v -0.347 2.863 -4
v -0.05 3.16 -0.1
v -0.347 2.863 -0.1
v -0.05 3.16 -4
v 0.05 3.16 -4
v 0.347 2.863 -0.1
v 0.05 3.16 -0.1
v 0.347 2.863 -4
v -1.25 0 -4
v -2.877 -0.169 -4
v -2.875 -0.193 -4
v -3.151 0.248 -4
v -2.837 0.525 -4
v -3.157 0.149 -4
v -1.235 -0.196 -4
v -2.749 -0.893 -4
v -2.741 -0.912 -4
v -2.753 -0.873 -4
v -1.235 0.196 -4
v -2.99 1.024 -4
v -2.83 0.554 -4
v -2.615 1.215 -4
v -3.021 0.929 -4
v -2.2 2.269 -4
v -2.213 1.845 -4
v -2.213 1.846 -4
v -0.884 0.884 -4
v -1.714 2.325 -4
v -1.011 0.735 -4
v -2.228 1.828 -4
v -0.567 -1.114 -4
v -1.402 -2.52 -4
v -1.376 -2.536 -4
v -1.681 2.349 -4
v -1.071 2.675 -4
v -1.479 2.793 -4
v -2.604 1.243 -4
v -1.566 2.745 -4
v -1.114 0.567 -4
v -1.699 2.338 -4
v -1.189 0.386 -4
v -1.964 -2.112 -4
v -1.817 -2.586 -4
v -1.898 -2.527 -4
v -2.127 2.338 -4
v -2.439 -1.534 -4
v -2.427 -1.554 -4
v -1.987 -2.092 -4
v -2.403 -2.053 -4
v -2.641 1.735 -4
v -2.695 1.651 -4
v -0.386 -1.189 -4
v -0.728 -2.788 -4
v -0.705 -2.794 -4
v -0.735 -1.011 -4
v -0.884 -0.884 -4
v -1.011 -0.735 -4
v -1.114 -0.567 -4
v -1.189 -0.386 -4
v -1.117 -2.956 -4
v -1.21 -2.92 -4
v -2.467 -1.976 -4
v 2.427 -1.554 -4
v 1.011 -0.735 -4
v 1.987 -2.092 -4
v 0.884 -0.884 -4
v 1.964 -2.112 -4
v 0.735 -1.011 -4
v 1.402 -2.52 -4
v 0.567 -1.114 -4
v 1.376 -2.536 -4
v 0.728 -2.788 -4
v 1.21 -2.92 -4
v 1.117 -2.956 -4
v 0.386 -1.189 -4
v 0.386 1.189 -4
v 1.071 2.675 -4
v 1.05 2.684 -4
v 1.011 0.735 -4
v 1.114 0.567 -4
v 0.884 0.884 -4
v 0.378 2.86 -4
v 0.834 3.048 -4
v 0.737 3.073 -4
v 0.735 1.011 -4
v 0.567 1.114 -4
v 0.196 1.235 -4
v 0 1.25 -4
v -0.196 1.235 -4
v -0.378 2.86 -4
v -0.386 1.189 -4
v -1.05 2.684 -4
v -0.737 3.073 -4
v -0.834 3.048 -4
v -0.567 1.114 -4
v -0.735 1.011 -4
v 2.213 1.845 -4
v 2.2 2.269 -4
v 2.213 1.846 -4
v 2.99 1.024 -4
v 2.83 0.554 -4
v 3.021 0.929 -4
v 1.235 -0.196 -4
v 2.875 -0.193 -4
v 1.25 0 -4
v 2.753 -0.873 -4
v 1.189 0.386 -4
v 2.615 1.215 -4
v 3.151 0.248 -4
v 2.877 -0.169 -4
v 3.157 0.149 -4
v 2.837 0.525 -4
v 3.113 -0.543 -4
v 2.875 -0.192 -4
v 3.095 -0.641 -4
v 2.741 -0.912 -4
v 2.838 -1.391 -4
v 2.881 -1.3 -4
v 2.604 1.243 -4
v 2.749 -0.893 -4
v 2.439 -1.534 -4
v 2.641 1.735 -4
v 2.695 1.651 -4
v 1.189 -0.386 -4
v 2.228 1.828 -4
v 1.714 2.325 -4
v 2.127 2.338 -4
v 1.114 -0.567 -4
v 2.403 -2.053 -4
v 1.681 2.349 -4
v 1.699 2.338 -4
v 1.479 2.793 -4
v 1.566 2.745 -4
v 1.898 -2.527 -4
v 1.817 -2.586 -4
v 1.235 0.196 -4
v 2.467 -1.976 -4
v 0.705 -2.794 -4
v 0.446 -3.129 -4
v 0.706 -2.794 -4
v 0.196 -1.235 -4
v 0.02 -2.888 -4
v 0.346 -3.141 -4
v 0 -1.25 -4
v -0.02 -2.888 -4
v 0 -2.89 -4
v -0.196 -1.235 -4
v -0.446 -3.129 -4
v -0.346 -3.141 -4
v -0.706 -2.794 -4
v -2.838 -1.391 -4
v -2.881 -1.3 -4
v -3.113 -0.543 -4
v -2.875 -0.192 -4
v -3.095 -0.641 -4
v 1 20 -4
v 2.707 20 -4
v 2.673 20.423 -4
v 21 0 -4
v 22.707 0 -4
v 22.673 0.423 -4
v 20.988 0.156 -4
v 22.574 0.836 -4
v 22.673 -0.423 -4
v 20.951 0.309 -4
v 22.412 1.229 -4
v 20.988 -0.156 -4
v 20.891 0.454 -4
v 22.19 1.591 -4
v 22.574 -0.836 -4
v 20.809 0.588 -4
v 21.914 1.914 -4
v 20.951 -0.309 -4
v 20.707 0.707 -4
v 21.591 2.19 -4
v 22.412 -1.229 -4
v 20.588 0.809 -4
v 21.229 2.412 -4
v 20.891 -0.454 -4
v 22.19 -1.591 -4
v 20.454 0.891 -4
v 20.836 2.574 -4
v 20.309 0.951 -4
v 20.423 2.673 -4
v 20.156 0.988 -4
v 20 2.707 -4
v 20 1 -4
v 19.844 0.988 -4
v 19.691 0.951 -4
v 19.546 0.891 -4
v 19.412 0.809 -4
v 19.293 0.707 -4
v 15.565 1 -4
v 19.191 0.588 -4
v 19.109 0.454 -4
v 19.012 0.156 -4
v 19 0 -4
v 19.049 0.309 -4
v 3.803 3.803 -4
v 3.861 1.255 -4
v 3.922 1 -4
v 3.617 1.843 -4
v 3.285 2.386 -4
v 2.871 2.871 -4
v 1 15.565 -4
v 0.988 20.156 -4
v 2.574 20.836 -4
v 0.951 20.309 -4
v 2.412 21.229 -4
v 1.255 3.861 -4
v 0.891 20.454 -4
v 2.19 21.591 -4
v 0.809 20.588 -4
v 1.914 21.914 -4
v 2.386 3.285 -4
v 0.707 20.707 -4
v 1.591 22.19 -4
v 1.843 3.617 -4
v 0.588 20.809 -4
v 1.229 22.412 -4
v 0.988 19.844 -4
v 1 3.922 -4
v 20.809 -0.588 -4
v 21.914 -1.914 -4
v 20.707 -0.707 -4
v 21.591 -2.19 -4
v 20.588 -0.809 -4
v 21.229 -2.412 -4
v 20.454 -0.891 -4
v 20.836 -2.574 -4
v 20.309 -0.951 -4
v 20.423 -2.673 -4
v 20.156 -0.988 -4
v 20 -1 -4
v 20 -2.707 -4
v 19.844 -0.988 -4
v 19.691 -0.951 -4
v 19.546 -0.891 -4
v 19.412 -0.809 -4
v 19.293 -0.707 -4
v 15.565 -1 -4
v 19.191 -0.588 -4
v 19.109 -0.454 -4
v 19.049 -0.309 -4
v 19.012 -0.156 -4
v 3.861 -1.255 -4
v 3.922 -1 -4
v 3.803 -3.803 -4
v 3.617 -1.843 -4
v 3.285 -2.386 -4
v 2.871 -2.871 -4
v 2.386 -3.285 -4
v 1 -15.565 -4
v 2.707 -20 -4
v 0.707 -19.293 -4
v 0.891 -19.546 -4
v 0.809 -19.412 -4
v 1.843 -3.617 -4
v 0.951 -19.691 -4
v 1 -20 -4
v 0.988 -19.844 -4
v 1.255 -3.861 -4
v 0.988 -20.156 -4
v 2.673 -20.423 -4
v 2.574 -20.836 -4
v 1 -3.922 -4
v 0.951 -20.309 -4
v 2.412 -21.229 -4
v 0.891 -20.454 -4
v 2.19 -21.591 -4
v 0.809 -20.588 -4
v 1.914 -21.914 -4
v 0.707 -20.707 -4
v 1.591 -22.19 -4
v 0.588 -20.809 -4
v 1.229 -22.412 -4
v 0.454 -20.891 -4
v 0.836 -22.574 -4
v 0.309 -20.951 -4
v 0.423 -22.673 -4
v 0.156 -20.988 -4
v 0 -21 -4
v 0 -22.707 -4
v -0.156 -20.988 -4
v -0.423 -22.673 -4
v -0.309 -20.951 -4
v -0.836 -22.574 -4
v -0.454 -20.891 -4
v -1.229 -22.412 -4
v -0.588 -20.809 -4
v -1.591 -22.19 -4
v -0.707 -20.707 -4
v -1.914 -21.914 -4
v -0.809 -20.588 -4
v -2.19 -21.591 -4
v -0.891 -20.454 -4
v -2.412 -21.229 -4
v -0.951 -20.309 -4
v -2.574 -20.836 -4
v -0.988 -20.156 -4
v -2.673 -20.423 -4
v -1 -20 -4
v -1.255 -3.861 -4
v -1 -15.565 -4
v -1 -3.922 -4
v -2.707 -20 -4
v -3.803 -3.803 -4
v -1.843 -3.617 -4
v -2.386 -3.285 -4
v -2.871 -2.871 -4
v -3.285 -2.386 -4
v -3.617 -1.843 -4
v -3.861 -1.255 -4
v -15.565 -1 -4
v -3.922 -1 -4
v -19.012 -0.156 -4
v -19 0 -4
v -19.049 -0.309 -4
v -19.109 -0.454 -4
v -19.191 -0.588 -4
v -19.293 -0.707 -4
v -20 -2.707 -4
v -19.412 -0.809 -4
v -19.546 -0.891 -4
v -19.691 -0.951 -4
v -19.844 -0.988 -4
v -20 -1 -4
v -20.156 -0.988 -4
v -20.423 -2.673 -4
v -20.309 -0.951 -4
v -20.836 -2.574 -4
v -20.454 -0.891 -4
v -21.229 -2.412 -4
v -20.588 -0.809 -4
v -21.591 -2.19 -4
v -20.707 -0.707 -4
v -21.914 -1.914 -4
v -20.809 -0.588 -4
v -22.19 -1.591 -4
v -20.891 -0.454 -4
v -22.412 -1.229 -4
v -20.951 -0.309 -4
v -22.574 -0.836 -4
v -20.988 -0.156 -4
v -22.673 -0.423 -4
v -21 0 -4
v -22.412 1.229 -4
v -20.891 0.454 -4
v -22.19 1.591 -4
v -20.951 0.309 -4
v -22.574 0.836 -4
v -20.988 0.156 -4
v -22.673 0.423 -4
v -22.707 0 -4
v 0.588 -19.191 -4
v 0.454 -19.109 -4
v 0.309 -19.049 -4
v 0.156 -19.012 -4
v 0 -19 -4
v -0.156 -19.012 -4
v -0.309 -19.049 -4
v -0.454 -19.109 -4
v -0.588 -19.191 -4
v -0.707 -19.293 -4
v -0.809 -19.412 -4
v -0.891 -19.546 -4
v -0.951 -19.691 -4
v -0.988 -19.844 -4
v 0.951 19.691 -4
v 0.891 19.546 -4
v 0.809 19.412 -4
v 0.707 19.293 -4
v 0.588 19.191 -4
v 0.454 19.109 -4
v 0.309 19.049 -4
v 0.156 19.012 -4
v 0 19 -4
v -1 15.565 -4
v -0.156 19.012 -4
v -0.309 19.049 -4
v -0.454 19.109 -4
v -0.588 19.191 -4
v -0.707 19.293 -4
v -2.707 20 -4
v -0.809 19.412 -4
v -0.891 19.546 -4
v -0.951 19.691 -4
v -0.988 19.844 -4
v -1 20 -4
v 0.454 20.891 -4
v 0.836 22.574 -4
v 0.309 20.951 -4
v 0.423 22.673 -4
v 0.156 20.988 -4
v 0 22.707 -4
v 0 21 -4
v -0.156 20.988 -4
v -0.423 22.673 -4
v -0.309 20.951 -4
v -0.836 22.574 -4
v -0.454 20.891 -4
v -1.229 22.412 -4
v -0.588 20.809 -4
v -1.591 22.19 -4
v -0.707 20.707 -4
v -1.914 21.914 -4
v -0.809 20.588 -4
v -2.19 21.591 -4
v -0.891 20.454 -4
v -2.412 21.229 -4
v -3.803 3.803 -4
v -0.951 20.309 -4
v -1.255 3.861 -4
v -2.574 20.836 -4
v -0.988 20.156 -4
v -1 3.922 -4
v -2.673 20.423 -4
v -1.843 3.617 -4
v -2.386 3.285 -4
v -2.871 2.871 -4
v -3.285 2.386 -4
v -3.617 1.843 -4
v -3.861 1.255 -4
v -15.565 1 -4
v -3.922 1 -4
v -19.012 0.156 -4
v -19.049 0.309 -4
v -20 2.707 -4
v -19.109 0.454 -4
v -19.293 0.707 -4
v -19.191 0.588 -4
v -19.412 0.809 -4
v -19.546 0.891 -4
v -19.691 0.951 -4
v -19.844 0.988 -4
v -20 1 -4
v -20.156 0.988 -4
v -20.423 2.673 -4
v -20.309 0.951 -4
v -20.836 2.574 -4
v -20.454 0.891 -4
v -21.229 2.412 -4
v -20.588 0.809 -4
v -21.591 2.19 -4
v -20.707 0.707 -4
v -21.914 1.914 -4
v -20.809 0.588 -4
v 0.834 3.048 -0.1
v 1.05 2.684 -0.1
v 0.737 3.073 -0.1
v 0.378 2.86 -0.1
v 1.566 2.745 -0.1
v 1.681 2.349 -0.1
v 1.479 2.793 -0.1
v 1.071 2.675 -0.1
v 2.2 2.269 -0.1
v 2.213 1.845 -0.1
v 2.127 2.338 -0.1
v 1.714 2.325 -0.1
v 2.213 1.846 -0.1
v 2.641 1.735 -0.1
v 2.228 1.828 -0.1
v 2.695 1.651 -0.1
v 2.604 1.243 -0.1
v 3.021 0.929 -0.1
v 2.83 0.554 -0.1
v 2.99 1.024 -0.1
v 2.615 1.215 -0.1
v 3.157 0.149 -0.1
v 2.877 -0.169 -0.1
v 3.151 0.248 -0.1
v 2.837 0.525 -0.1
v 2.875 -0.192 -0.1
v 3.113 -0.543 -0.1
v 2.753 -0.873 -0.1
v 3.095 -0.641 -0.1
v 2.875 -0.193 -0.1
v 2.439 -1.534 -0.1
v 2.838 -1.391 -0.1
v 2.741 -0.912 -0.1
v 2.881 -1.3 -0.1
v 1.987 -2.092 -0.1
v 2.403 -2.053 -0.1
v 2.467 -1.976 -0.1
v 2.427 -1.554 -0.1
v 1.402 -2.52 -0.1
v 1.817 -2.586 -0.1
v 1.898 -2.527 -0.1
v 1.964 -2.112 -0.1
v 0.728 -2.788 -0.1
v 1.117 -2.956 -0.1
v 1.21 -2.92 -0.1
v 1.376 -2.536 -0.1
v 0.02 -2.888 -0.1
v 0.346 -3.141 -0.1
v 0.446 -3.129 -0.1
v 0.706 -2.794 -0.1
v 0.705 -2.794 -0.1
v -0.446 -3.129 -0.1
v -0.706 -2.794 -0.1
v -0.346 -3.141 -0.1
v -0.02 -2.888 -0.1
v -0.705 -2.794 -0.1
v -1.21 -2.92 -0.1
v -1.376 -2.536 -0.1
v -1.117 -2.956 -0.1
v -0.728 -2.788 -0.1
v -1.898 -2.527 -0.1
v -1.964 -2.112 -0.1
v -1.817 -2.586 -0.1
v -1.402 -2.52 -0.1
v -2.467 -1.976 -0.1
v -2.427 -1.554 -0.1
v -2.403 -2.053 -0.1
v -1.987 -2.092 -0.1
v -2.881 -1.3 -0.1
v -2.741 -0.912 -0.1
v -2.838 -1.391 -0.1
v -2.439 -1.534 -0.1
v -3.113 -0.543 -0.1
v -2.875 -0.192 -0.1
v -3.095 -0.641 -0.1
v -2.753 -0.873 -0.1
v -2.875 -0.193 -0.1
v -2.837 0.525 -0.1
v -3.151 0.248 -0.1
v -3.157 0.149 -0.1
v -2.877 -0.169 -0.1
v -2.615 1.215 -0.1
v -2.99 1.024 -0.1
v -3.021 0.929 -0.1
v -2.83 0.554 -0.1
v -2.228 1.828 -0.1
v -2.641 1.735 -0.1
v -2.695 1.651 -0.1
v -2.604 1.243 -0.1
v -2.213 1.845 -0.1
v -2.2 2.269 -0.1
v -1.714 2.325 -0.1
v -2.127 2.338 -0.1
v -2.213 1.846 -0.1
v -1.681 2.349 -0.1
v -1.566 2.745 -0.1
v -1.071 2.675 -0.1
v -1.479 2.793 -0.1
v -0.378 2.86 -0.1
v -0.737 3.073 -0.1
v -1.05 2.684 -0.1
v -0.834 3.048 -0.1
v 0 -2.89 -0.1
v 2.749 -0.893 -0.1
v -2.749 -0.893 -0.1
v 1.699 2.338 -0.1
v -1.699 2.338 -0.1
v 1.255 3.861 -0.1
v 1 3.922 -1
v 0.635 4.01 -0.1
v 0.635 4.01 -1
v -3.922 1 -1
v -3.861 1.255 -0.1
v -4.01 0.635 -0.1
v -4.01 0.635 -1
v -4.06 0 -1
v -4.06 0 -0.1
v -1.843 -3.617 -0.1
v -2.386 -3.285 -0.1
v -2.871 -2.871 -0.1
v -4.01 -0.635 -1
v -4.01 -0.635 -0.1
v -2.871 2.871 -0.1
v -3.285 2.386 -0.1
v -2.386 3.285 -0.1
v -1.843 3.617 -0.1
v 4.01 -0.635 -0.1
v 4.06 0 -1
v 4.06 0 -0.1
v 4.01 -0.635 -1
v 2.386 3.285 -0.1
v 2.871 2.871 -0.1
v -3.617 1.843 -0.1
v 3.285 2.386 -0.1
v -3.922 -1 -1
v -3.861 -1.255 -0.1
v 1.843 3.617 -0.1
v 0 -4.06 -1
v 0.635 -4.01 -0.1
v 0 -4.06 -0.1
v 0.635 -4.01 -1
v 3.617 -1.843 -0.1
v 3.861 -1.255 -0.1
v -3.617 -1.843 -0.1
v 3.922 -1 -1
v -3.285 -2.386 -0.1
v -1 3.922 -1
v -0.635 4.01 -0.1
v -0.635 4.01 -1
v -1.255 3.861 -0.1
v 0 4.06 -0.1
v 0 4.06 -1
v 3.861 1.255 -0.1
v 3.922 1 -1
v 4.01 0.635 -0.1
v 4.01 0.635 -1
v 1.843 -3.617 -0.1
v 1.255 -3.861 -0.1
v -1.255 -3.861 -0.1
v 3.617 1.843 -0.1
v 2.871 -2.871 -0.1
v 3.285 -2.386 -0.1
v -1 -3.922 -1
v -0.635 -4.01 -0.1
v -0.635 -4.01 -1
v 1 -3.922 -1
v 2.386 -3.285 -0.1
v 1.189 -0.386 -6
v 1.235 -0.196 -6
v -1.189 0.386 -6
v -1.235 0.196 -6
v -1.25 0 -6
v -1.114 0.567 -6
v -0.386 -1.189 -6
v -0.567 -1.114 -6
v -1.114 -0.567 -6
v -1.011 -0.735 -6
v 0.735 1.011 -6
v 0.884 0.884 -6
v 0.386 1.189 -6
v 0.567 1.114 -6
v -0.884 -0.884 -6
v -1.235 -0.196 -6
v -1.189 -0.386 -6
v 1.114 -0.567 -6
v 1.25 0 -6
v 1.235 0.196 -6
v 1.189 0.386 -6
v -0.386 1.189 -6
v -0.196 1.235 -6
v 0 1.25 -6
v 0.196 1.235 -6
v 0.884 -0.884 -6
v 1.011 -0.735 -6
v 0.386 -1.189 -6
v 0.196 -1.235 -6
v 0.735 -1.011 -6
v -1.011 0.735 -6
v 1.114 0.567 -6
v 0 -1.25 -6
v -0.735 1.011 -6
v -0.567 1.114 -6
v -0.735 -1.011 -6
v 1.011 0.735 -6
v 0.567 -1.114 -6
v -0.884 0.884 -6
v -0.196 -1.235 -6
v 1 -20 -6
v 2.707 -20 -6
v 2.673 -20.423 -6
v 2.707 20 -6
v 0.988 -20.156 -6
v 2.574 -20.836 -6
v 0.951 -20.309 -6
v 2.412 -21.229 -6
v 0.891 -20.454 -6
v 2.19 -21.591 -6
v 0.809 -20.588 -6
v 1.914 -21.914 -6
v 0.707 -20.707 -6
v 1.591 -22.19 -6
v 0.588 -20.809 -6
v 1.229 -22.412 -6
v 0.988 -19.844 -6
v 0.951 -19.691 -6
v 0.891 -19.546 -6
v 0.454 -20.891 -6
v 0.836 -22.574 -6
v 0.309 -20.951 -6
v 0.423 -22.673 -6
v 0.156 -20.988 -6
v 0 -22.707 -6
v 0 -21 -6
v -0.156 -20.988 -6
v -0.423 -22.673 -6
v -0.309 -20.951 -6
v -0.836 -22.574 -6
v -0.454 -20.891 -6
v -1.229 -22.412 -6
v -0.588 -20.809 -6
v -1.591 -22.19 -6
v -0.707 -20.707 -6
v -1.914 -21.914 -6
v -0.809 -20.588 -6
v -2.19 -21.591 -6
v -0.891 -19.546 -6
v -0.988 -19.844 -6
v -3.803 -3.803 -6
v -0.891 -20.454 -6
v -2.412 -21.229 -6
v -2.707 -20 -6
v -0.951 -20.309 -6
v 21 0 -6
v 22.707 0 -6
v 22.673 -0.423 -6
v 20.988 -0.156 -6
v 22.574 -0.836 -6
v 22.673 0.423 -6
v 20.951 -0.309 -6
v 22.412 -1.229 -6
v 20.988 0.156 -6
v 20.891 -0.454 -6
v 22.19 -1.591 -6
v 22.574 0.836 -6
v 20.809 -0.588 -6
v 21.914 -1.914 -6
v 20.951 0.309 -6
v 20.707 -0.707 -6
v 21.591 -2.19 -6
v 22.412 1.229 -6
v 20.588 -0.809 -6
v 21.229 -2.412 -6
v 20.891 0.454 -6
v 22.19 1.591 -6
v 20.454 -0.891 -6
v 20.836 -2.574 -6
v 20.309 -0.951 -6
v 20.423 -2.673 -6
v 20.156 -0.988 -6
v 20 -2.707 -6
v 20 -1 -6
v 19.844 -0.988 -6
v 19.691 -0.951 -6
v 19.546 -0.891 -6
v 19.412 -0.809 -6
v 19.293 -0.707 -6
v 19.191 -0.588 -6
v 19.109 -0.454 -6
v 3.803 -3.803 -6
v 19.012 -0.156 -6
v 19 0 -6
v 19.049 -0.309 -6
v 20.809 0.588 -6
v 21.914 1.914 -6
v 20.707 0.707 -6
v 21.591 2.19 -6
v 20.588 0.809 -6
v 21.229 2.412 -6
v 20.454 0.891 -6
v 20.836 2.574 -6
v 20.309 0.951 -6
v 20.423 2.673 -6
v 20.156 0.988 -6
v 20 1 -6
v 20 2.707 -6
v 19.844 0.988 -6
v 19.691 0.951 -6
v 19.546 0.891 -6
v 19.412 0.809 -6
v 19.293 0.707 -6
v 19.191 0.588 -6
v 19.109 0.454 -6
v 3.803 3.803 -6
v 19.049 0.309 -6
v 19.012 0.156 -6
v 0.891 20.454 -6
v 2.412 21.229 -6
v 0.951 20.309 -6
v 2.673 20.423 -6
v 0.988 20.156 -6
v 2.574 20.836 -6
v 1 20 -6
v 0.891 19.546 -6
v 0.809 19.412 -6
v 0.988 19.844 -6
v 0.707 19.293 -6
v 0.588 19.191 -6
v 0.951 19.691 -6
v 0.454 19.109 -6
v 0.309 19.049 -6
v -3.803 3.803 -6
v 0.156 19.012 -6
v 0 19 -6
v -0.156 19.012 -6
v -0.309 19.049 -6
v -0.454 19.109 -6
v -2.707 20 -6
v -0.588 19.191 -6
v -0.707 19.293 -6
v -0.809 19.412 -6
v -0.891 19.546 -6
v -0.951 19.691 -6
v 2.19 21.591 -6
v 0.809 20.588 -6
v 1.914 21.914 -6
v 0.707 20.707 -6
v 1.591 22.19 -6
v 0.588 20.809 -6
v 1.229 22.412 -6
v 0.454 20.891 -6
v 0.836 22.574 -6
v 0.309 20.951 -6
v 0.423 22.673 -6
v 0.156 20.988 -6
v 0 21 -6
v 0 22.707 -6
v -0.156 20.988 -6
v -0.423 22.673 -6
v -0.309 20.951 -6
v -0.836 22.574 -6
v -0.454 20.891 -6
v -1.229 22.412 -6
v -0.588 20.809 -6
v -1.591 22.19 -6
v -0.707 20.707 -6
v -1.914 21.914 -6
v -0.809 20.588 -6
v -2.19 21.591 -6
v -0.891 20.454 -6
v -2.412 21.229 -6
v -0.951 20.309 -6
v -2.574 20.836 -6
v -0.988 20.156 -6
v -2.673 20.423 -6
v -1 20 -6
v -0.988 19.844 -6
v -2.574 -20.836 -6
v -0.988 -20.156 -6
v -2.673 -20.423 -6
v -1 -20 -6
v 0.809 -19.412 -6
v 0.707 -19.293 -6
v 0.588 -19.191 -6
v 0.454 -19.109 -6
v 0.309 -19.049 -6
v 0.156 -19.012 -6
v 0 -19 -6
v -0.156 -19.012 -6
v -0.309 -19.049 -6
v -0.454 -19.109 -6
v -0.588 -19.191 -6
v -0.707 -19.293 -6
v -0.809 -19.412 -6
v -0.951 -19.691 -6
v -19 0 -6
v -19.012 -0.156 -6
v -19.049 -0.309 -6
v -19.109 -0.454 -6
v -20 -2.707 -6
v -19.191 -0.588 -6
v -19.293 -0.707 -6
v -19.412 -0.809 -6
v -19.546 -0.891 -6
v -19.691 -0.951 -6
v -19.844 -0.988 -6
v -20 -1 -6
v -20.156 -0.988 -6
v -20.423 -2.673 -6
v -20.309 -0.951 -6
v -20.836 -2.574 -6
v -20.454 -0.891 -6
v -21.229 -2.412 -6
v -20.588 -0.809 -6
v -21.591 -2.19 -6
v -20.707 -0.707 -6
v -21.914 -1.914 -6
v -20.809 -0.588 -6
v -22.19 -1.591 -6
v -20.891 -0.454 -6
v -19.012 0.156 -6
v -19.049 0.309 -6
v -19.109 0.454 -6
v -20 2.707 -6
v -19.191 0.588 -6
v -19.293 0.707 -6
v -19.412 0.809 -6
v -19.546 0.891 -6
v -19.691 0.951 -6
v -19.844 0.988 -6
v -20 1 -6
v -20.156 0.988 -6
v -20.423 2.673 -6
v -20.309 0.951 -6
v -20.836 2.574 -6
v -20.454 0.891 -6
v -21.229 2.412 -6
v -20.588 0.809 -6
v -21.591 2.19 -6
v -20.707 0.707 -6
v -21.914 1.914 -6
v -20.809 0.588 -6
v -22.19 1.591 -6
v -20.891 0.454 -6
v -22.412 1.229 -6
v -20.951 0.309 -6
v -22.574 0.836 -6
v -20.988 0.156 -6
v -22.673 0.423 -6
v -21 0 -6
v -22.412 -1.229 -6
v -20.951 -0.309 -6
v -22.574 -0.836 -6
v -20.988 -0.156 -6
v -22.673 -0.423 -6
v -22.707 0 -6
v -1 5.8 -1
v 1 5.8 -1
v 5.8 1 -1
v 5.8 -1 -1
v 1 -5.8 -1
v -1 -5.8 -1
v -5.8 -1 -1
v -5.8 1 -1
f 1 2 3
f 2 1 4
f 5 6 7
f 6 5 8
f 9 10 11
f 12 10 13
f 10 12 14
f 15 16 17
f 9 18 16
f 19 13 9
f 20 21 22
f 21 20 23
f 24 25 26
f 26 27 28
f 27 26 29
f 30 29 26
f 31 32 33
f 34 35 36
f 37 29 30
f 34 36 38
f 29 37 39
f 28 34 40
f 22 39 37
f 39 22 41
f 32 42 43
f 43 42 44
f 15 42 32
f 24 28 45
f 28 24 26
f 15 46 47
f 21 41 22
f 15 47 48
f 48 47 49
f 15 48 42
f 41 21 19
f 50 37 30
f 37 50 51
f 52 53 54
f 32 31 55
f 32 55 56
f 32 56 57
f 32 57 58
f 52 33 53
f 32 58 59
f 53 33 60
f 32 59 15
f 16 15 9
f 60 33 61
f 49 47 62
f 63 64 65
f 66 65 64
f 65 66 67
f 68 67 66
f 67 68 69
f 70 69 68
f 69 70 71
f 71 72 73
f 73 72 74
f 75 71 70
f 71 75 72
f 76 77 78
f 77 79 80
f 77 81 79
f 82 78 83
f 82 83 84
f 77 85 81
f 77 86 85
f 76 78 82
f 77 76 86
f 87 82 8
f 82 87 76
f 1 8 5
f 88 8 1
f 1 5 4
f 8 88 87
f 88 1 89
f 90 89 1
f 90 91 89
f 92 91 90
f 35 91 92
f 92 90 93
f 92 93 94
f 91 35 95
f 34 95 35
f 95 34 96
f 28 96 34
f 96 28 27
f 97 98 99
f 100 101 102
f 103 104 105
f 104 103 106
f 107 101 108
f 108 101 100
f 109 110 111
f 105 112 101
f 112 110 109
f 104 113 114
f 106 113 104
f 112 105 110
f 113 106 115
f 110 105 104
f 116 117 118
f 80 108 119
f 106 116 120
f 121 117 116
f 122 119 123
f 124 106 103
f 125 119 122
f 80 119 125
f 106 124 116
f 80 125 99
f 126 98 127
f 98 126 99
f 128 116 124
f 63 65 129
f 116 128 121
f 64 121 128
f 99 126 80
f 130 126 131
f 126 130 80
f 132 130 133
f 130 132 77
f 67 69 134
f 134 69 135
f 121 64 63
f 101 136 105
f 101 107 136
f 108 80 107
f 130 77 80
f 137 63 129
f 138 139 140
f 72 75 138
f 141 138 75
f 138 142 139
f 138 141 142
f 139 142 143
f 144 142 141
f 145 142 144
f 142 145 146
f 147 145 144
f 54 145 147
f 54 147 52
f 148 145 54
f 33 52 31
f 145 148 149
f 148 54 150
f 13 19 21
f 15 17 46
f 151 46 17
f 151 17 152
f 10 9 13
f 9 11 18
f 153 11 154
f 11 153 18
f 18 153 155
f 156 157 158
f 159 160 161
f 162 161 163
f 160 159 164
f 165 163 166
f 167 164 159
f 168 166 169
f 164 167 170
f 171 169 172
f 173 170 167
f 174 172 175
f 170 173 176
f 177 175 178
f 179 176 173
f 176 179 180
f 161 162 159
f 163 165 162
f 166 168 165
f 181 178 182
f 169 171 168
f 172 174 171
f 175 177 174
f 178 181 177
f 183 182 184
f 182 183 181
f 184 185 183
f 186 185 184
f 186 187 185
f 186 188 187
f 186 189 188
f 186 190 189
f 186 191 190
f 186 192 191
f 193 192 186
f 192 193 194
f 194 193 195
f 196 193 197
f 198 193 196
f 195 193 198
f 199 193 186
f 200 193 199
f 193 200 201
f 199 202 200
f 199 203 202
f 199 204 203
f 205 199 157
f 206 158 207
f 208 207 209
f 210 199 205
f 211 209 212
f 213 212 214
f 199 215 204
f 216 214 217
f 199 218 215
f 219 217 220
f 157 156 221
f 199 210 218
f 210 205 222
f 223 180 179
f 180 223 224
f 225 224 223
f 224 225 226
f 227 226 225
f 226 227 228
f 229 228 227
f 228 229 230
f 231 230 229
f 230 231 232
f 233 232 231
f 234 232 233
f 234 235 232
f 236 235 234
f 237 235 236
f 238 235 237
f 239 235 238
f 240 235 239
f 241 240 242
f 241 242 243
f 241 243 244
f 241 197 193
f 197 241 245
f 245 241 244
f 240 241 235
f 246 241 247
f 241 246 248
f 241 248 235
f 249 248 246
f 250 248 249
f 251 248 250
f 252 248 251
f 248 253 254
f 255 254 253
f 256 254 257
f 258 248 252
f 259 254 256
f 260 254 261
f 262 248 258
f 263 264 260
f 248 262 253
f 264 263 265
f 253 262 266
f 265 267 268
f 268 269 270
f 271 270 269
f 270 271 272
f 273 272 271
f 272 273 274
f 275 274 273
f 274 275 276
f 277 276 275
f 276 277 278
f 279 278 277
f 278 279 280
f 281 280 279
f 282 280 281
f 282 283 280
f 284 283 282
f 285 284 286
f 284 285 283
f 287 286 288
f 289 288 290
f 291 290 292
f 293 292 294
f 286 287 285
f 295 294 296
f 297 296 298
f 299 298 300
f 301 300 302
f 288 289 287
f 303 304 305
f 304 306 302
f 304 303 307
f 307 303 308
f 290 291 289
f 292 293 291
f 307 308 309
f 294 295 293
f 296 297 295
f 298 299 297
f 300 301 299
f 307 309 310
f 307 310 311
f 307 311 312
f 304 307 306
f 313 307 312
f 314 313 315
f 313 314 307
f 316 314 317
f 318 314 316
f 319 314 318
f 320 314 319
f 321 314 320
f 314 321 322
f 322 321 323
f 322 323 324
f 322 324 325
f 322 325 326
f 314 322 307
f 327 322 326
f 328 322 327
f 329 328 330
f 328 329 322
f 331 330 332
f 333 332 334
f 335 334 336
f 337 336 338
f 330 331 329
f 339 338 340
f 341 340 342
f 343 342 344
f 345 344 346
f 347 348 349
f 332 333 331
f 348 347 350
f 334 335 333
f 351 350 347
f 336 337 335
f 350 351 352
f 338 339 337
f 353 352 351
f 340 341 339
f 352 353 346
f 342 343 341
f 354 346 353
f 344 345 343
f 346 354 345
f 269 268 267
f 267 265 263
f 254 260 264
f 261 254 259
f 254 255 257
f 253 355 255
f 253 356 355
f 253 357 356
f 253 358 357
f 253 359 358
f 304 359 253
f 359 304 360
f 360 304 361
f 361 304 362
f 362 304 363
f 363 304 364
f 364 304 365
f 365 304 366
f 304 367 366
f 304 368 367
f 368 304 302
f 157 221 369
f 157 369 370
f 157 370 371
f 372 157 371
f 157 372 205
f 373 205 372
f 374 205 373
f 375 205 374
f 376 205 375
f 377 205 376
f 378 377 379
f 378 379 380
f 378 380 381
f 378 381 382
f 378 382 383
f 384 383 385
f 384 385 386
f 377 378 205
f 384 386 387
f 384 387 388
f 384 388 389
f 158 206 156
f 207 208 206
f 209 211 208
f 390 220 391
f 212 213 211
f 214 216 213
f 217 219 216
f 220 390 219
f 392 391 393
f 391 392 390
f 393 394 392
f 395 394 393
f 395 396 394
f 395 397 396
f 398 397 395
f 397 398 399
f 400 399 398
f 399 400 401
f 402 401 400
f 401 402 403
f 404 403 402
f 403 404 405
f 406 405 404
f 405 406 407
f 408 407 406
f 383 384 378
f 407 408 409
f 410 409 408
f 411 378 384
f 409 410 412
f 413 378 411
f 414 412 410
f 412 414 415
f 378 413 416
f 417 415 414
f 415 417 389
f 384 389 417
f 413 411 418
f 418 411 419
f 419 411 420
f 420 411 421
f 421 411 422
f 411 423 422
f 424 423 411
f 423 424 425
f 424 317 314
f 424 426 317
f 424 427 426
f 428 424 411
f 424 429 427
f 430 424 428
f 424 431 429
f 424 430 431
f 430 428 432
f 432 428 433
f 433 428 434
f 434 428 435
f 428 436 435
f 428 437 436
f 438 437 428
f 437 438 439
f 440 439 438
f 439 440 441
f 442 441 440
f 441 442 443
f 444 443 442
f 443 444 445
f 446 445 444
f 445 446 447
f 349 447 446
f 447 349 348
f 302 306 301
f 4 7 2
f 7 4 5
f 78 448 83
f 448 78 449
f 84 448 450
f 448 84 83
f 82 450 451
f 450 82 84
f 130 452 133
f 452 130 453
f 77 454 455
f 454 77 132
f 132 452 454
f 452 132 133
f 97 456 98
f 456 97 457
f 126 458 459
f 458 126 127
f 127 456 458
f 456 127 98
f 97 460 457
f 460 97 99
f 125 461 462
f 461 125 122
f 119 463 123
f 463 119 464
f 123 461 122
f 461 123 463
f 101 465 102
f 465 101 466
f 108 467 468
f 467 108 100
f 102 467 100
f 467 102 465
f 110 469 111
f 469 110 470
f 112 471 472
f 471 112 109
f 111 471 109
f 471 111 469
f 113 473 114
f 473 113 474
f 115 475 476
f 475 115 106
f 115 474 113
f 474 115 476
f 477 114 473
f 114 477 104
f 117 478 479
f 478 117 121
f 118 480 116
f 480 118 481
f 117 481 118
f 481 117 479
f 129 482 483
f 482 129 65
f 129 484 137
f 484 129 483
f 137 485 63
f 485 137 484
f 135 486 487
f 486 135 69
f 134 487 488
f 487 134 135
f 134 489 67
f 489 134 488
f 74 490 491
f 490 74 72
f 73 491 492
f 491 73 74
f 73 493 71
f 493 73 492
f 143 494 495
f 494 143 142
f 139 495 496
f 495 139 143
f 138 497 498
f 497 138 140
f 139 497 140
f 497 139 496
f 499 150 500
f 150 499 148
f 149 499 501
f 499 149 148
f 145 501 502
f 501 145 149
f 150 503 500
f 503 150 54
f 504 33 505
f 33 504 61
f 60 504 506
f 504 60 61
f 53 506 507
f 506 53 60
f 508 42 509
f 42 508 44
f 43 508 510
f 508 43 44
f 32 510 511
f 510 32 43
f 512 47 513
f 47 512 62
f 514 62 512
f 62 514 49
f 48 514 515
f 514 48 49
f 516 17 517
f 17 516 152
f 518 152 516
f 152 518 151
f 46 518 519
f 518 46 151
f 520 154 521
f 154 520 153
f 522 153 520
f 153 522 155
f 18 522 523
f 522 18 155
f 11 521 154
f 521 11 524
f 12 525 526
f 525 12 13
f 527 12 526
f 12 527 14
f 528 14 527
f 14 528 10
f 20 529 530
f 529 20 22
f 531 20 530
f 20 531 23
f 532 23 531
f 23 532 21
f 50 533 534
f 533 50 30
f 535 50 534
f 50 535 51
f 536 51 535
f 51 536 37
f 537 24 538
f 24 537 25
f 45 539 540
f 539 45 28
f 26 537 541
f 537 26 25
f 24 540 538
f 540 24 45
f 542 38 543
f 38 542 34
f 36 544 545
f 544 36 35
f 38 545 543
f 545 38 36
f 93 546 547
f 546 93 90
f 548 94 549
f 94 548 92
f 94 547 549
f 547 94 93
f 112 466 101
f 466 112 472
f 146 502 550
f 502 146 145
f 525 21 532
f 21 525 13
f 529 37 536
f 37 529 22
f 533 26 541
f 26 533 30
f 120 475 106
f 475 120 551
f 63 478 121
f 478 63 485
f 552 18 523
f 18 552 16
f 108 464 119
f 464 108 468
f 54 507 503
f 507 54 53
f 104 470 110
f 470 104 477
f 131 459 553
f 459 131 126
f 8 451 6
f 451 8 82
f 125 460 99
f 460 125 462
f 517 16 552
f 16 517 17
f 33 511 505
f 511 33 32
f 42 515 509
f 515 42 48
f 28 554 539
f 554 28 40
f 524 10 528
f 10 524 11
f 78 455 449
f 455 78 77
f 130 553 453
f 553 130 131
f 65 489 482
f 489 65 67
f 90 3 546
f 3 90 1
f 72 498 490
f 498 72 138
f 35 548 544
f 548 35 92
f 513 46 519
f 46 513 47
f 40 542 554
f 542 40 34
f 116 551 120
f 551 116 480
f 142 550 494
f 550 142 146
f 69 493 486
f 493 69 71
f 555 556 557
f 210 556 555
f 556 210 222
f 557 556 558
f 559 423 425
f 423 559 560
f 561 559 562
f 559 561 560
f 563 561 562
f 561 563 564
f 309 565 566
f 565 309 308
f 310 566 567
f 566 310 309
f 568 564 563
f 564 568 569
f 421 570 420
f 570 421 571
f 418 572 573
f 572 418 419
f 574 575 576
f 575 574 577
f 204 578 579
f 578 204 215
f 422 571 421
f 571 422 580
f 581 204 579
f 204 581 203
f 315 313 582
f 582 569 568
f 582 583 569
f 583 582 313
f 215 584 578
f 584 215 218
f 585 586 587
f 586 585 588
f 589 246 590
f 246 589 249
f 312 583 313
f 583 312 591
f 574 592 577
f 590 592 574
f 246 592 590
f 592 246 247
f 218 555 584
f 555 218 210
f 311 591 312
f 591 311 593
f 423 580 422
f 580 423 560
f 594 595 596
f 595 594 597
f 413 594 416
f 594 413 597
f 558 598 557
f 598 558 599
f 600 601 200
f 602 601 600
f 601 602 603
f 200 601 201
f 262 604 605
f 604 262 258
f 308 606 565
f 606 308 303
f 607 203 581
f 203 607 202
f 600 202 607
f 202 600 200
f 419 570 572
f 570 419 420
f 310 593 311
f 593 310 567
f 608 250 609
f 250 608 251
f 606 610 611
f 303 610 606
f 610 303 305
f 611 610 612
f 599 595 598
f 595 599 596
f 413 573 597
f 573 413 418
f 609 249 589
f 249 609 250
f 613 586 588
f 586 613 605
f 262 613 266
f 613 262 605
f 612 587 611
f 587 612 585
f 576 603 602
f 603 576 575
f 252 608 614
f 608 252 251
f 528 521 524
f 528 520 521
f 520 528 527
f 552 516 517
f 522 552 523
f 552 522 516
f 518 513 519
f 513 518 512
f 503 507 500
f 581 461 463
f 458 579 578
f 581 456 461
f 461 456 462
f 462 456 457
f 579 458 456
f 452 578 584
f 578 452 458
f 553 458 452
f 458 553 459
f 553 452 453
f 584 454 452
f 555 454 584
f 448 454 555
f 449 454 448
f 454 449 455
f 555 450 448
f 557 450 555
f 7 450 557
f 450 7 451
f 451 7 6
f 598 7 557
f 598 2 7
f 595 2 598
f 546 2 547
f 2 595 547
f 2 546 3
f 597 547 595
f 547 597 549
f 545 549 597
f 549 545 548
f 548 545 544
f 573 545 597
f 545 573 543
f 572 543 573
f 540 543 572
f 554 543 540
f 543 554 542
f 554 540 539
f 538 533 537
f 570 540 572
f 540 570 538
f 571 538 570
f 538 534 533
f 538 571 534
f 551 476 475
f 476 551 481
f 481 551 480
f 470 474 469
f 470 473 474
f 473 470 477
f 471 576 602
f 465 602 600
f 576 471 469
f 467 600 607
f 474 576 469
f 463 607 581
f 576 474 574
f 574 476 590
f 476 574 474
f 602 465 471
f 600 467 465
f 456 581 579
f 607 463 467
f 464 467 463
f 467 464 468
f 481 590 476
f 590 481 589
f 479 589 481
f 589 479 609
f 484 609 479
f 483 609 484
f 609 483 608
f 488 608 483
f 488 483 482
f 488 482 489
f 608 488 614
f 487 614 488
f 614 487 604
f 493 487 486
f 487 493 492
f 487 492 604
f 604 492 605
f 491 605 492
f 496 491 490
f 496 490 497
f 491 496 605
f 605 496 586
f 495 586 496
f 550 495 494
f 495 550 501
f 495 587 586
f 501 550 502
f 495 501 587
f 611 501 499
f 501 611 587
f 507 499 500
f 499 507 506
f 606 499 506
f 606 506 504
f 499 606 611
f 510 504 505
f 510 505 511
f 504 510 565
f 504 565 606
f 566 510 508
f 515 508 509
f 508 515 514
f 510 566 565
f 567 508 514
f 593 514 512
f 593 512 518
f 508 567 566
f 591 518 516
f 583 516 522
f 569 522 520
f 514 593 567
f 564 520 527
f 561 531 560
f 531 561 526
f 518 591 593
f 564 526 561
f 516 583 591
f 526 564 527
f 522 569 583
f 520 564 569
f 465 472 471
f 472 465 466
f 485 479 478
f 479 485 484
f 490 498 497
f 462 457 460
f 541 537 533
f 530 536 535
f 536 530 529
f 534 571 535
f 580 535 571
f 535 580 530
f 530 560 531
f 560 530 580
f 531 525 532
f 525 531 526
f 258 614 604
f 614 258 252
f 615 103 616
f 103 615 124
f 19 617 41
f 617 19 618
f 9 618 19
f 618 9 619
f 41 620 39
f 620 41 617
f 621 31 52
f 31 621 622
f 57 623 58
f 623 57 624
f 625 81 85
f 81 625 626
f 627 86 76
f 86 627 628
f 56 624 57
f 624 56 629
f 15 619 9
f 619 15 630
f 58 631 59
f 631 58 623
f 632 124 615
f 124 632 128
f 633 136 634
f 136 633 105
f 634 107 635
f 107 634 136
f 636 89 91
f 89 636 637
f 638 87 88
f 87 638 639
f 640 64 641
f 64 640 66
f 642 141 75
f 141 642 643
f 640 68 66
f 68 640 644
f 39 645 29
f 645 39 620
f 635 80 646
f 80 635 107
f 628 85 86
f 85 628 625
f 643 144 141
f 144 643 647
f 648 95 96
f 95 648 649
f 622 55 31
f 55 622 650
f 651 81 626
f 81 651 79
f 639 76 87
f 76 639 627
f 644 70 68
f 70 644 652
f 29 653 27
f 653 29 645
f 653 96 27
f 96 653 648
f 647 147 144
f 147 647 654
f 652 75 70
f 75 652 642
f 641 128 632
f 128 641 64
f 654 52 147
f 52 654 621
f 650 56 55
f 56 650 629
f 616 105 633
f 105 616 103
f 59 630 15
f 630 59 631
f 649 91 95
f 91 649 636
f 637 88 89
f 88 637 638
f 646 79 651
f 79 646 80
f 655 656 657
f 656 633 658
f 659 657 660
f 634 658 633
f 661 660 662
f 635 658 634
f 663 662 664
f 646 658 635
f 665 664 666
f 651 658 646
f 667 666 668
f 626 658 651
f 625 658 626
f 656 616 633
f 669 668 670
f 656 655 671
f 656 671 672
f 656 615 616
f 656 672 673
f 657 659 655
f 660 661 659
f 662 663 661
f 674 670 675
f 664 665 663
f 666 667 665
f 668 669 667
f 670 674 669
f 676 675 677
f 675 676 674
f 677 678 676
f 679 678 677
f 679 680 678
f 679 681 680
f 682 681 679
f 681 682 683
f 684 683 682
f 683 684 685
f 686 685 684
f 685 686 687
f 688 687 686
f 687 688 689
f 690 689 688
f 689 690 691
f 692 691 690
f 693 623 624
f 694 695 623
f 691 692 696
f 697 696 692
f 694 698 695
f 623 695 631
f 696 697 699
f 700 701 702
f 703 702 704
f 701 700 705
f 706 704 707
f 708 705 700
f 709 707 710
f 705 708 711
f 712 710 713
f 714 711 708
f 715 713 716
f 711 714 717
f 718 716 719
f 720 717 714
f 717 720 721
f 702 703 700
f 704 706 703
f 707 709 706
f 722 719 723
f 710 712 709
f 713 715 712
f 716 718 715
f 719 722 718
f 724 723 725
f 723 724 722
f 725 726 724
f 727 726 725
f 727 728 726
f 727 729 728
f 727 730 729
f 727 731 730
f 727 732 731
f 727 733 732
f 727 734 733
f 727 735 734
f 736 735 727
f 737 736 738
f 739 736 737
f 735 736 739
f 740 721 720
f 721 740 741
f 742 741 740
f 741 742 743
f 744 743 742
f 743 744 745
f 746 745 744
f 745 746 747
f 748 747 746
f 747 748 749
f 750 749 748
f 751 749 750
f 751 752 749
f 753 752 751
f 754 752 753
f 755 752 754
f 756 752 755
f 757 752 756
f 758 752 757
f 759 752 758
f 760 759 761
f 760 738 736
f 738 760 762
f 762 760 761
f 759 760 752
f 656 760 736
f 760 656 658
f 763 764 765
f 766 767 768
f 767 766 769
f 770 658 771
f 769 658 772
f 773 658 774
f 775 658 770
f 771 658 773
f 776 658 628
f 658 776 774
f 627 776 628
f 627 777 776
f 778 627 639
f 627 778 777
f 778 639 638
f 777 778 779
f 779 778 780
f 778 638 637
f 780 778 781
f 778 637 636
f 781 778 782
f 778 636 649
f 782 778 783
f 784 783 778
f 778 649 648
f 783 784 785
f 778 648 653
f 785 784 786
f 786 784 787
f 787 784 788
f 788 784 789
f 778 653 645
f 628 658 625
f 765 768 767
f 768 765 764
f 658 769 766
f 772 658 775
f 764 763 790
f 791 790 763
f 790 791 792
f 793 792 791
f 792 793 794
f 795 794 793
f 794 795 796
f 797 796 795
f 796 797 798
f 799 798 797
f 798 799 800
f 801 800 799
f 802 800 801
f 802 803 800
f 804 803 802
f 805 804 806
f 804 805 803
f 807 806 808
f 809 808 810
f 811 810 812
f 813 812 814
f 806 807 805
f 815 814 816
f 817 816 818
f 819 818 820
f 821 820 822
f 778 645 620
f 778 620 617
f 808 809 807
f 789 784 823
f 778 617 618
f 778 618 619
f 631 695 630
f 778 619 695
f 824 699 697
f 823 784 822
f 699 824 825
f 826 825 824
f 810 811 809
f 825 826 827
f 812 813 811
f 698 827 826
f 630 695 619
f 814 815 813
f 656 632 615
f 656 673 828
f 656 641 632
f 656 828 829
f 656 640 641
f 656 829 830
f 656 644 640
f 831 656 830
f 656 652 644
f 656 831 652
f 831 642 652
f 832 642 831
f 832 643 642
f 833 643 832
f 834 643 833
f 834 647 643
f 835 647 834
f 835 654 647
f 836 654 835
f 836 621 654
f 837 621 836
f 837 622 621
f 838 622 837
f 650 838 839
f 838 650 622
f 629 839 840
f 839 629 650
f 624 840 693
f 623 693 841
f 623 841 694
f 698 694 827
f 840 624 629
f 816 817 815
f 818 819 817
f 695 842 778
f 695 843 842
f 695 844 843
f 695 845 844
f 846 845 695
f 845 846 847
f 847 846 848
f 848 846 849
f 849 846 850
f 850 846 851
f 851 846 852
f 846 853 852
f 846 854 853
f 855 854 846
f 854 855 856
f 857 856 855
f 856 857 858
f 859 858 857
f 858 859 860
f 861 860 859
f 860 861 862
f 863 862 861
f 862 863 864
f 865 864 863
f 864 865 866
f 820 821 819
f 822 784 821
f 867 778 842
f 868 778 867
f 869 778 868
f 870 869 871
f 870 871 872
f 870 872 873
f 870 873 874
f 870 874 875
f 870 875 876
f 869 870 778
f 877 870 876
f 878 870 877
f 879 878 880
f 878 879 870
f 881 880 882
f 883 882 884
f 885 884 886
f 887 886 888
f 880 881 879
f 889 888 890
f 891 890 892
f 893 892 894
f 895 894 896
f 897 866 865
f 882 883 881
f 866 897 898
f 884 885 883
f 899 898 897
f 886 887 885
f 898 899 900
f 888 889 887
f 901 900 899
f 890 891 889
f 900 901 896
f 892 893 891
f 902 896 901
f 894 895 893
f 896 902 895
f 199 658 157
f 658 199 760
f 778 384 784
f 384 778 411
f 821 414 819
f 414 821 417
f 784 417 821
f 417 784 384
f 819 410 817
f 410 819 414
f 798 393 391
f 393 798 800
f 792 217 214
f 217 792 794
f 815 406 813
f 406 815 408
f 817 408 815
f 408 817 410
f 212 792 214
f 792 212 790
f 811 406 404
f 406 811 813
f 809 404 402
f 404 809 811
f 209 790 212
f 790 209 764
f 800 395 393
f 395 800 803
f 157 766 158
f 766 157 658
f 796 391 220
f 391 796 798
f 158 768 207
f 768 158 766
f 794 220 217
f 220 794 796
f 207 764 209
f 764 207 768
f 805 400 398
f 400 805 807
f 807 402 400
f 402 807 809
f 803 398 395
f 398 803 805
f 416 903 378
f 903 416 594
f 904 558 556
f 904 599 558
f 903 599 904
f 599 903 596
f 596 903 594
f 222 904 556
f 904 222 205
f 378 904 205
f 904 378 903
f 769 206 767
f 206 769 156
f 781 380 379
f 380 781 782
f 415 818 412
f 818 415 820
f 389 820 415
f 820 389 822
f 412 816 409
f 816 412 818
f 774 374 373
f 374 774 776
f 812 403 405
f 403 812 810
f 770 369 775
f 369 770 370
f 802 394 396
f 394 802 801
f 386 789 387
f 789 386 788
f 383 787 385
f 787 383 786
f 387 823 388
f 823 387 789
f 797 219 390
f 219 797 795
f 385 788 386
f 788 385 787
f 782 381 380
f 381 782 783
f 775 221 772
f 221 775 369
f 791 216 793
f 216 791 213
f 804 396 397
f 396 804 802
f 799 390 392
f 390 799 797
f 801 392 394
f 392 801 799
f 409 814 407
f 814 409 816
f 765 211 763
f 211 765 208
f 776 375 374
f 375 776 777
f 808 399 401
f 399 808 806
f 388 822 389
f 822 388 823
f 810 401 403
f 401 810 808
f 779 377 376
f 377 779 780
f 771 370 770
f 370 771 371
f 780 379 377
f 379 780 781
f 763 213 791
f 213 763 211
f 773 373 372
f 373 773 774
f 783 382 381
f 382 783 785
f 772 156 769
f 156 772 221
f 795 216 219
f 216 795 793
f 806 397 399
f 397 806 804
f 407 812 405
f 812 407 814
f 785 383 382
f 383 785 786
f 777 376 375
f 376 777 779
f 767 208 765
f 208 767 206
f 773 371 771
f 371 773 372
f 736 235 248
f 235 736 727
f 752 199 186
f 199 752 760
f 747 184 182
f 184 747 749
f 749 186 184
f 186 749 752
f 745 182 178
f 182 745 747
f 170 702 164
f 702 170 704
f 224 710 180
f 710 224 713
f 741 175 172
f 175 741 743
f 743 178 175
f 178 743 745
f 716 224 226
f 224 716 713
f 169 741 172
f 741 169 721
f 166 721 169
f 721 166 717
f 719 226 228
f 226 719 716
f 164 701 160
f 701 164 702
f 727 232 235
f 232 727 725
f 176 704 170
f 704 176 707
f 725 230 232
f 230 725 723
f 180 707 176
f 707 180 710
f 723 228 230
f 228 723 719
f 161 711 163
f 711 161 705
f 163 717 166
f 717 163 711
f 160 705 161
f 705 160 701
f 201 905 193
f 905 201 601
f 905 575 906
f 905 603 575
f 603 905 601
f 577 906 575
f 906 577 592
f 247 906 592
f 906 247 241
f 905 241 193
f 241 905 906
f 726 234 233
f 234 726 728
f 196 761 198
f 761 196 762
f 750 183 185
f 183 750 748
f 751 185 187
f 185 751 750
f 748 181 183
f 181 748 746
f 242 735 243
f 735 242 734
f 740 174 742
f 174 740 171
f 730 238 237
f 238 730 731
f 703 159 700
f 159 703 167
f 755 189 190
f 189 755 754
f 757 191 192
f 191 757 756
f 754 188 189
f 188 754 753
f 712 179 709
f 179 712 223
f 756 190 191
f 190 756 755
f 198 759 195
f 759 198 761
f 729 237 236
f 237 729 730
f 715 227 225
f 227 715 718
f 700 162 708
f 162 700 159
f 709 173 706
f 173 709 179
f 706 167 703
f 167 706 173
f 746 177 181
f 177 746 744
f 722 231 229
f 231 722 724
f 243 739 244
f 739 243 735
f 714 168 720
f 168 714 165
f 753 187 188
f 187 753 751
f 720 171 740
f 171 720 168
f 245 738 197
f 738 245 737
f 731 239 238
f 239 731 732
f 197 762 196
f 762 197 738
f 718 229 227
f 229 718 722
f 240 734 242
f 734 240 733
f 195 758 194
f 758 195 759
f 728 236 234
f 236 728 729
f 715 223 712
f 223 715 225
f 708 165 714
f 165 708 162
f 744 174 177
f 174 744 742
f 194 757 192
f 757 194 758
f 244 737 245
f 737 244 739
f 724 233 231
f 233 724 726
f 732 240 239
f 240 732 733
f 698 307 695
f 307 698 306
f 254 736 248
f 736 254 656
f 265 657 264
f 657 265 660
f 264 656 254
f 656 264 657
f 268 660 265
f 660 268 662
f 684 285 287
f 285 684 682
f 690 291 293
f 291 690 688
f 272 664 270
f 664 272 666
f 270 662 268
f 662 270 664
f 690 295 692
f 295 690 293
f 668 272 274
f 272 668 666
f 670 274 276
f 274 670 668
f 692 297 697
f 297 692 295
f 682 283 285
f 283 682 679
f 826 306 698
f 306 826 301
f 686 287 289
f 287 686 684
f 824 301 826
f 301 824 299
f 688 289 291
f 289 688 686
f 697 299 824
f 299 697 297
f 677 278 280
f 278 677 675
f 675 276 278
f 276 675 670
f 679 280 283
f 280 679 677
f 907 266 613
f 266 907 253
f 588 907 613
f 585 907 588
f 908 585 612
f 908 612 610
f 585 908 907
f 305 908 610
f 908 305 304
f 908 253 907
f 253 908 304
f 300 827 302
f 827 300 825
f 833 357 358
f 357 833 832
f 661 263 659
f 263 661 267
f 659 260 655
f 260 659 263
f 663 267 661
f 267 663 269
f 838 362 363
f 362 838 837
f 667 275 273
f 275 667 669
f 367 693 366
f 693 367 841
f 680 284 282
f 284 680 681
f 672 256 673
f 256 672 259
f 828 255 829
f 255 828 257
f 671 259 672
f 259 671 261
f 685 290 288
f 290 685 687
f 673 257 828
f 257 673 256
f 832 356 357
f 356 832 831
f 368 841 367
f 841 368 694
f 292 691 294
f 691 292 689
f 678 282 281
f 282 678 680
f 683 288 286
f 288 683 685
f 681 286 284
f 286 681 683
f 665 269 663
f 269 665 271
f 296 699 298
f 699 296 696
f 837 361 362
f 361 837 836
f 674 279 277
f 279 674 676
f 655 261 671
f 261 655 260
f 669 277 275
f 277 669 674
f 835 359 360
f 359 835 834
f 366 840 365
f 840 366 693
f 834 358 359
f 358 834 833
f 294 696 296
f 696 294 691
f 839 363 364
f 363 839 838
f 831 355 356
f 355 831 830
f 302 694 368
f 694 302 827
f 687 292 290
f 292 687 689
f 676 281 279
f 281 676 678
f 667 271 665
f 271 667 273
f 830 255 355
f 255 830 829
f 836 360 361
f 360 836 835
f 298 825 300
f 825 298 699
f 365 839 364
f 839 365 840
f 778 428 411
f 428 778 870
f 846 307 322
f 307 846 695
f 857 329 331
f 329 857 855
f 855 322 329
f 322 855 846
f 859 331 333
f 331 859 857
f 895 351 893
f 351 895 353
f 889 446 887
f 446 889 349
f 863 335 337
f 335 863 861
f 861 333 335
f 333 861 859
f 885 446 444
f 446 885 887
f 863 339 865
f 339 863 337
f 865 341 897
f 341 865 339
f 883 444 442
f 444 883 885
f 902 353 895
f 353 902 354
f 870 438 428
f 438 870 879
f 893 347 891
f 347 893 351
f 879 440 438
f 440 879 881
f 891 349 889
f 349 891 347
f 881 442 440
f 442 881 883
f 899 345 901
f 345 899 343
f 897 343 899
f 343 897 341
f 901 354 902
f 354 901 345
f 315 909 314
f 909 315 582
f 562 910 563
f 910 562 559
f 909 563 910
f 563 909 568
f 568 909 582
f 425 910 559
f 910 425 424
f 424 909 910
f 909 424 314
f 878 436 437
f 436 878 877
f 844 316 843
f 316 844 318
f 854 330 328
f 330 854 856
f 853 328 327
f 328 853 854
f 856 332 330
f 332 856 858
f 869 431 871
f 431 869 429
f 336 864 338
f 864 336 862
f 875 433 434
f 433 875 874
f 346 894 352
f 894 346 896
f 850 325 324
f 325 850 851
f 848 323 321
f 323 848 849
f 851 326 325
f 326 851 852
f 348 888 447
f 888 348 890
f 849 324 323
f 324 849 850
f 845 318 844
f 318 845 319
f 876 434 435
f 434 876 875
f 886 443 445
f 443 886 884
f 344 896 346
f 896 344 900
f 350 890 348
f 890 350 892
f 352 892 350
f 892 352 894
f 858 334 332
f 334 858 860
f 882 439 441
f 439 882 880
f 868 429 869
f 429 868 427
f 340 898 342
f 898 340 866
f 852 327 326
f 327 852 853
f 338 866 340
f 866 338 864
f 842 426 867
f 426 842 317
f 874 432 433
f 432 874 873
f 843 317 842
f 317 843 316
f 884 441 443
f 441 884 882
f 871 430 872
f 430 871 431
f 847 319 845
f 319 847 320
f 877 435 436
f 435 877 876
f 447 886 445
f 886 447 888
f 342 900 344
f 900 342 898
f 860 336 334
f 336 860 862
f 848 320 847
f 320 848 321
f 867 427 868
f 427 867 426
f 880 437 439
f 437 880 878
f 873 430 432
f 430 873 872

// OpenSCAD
// [FL_INDEX: keywords="openscad, 3d_parametric, Parametric_servo_arms, csg_solid" | COT="Parametric OpenSCAD design from 3DCodeverse"]
// Title: Parametric servo arms

/**
 *  Parametric servo arm generator for OpenScad
 *  Générateur de palonnier de servo pour OpenScad
 *
 *  Copyright (c) 2012 Charles Rincheval.  All rights reserved.
 *
 *  This library is free software; you can redistribute it and/or
 *  modify it under the terms of the GNU Lesser General Public
 *  License as published by the Free Software Foundation; either
 *  version 2.1 of the License, or (at your option) any later version.
 *
 *  This library is distributed in the hope that it will be useful,
 *  but WITHOUT ANY WARRANTY; without even the implied warranty of
 *  MERCHANTABILITY or FITNESS FOR A PARTICULAR PURPOSE.  See the GNU
 *  Lesser General Public License for more details.
 *
 *  You should have received a copy of the GNU Lesser General Public
 *  License along with this library; if not, write to the Free Software
 *  Foundation, Inc., 51 Franklin St, Fifth Floor, Boston, MA  02110-1301  USA
 *
 *  Last update :
 *  https://github.com/hugokernel/OpenSCAD_ServoArms
 *
 *  http://www.digitalspirit.org/
 */

arm_length = 20;

arm_count = 4; // [1,2,3,4,5,6,7,8]

//  Clear between arm head and servo head (PLA: 0.3, ABS 0.2)
SERVO_HEAD_CLEAR = 0.2; // [0.2,0.3,0.4,0.5]

$fn = 40 / 1;

/**
 *  Head / Tooth parameters
 *  Futaba 3F Standard Spline
 *  http://www.servocity.com/html/futaba_servo_splines.html
 *
 *  First array (head related) :
 *  0. Head external diameter
 *  1. Head heigth
 *  2. Head thickness
 *  3. Head screw diameter
 *
 *  Second array (tooth related) :
 *  0. Tooth count
 *  1. Tooth height
 *  2. Tooth length
 *  3. Tooth width
 */
FUTABA_3F_SPLINE = [
    [5.92, 4, 1.1, 2.5],
    [25, 0.3, 0.7, 0.1]
];

module servo_futaba_3f(length, count) {
    servo_arm(FUTABA_3F_SPLINE, [length, count]);
}

/**
 *  If you want to support a new servo, juste add a new spline definition array
 *  and a module named like servo_XXX_YYY where XXX is servo brand and YYY is the
 *  connection type (3f) or the servo type (s3003)
 */

module servo_standard(length, count) {
    servo_futaba_3f(length, count);
}

/**
 *  Tooth
 *
 *    |<-w->|
 *    |_____|___
 *    /     \  ^h
 *  _/       \_v
 *   |<--l-->|
 *
 *  - tooth length (l)
 *  - tooth width (w)
 *  - tooth height (h)
 *  - height
 *
 */
module servo_head_tooth(length, width, height, head_height) {
    linear_extrude(height = head_height) {
        polygon([[-length / 2, 0], [-width / 2, height], [width / 2, height], [length / 2,0]]);
    }
}

/**
 *  Servo head
 */
module servo_head(params, clear = SERVO_HEAD_CLEAR) {

    head = params[0];
    tooth = params[1];

    head_diameter = head[0];
    head_heigth = head[1];

    tooth_count = tooth[0];
    tooth_height = tooth[1];
    tooth_length = tooth[2];
    tooth_width = tooth[3];

    % cylinder(r = head_diameter / 2, h = head_heigth + 1);

    cylinder(r = head_diameter / 2 - tooth_height + 0.03 + clear, h = head_heigth);

    for (i = [0 : tooth_count]) {
        rotate([0, 0, i * (360 / tooth_count)]) {
            translate([0, head_diameter / 2 - tooth_height + clear, 0]) {
                servo_head_tooth(tooth_length, tooth_width, tooth_height, head_heigth);
            }
        }
    }
}

/**
 *  Servo hold
 *  - Head / Tooth parameters
 *  - Arms params (length and count)
 */
module servo_arm(params, arms) {

    head = params[0];
    tooth = params[1];

    head_diameter = head[0];
    head_heigth = head[1];
    head_thickness = head[2];
    head_screw_diameter = head[3];

    tooth_length = tooth[2];
    tooth_width = tooth[3];

    arm_length = arms[0];
    arm_count = arms[1];

    /**
     *  Servo arm
     *  - length is from center to last hole
     */
    module arm(tooth_length, tooth_width, head_height, head_heigth, hole_count = 1) {

        arm_screw_diameter = 2;

        difference() {
            union() {
                cylinder(r = tooth_width / 2, h = head_heigth);

                linear_extrude(height = head_heigth) {
                    polygon([
                        [-tooth_width / 2, 0], [-tooth_width / 3, tooth_length],
                        [tooth_width / 3, tooth_length], [tooth_width / 2, 0]
                    ]);
                }

                translate([0, tooth_length, 0]) {
                    cylinder(r = tooth_width / 3, h = head_heigth);
                }

                if (tooth_length >= 12) {
                    translate([-head_heigth / 2 + 2, 3.8, -4]) {
                        rotate([90, 0, 0]) {
                            rotate([0, -90, 0]) {
                                linear_extrude(height = head_heigth) {
                                    polygon([
                                        [-tooth_length / 1.7, 4], [0, 4], [0, - head_height + 5],
                                        [-2, - head_height + 5]
                                    ]);
                                }
                            }
                        }
                    }
                }
            }

            // Hole
            for (i = [0 : hole_count - 1]) {
                //translate([0, length - (length / hole_count * i), -1]) {
                translate([0, tooth_length - (4 * i), -1]) {
                    cylinder(r = arm_screw_diameter / 2, h = 10);
                }
            }

            cylinder(r = head_screw_diameter / 2, h = 10);
        }
    }

    difference() {
        translate([0, 0, 0.1]) {
            cylinder(r = head_diameter / 2 + head_thickness, h = head_heigth + 1);
        }

        cylinder(r = head_screw_diameter / 2, h = 10);

        servo_head(params);
    }

    arm_thickness = head_thickness;

    // Arm
    translate([0, 0, head_heigth]) {
        for (i = [0 : arm_count - 1]) {
            rotate([0, 0, i * (360 / arm_count)]) {
                arm(arm_length, head_diameter + arm_thickness * 2, head_heigth, 2);
            }
        }
    }
}

module demo() {
    rotate([0, 180, 0])
        servo_standard(arm_length, arm_count);
}

demo();
